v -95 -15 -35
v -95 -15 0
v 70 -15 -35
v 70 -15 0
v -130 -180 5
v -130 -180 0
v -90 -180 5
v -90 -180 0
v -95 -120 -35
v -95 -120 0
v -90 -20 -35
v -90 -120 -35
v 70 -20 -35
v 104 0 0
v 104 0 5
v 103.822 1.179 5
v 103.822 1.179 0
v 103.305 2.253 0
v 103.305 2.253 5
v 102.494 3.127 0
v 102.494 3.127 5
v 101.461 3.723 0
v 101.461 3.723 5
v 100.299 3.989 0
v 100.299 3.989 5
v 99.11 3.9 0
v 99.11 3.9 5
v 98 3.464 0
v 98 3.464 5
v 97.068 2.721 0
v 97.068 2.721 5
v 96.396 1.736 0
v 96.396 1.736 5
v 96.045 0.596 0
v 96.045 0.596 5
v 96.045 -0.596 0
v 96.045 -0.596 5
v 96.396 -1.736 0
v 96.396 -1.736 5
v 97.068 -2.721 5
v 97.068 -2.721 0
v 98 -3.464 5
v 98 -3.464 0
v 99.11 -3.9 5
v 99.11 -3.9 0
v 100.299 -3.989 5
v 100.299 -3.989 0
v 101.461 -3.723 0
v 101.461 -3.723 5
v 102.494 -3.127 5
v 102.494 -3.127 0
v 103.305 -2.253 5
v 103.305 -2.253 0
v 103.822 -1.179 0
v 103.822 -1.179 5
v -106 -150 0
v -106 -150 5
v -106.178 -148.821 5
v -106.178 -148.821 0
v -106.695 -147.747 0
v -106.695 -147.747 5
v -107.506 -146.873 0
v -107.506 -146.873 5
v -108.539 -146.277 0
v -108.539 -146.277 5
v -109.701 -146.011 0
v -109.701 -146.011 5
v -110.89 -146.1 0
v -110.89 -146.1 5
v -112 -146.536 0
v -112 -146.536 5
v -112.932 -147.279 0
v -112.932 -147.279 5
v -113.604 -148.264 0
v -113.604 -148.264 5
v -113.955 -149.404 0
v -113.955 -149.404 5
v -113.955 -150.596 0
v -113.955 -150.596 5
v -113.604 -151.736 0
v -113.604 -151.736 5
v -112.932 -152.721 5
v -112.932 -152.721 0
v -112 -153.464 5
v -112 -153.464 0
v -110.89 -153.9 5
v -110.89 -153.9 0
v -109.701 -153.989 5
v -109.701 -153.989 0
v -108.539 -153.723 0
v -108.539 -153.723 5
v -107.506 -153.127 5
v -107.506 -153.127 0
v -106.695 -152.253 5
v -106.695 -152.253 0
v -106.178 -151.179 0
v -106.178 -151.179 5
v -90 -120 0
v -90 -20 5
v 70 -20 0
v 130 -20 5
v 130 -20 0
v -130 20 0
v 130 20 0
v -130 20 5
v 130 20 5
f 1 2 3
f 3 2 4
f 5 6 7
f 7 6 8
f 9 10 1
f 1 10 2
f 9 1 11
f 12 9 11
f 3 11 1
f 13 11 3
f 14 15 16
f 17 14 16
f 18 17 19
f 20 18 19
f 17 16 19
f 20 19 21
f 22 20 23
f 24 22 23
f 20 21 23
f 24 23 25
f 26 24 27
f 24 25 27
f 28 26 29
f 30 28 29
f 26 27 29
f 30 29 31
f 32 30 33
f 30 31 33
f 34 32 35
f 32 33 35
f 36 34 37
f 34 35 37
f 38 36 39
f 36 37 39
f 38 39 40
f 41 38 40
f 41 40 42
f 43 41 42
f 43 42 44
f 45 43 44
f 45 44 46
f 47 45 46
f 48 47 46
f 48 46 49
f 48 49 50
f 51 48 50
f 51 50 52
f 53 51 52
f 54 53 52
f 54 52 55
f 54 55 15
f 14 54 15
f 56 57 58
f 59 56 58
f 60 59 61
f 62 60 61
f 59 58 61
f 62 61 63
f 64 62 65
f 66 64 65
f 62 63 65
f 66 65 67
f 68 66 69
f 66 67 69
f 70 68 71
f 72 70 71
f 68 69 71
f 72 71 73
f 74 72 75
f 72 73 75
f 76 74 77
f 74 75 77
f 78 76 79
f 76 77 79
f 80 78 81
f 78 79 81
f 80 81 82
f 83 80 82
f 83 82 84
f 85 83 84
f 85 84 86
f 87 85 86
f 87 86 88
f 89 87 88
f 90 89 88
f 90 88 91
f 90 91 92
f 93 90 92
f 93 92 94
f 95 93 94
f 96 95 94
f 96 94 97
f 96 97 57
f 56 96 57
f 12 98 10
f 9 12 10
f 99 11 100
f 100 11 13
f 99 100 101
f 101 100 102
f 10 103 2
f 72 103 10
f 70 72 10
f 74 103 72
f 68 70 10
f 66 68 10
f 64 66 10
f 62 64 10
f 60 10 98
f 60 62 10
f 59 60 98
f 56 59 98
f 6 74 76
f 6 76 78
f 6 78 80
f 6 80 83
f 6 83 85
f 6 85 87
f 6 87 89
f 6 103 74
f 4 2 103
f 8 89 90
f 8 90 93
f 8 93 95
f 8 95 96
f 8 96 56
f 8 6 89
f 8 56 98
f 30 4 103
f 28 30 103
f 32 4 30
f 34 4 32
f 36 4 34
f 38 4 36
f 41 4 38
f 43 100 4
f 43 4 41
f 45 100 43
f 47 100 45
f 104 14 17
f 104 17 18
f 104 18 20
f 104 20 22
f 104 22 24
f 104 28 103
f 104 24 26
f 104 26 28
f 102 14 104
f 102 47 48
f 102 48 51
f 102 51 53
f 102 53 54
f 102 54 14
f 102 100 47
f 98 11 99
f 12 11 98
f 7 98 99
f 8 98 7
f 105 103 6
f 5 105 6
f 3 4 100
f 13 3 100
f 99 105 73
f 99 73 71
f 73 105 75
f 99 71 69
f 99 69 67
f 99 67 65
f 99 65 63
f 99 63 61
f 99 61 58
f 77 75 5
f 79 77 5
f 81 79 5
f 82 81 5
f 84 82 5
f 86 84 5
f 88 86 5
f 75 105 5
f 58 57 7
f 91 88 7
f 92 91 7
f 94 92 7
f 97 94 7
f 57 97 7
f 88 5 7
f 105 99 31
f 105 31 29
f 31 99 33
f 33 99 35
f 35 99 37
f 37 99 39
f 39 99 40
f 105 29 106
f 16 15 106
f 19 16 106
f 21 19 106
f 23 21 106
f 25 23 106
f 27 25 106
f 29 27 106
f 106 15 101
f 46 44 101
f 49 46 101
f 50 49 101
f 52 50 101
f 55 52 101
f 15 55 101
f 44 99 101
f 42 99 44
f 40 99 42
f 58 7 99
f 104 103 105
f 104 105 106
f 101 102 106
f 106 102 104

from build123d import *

# Parameters (mm, degrees)
F0_W     = 260
F0_H     = 40
F1_DEPTH = 5
F2_W     = 160
F2_H     = 5
F3_DEPTH = 35
F4_W     = 40
F4_H     = 160
F5_DEPTH = 5
F7_DEPTH = 35
F8_R     = 4
F9_DEPTH = 25


with BuildPart() as f1:
    # F0 (on Top) → F1 (new body)
    with BuildSketch(Plane.XY):
        Rectangle(F0_W, F0_H)
    extrude(amount=F1_DEPTH)

    # F2 (on face) → F3 (join)
    with BuildSketch(Plane(origin=(0, 0, 0), x_dir=(1, 0, 0), z_dir=(0, 0, -1))):
        with Locations((-10, 17.5)):
            Rectangle(F2_W, F2_H)
    extrude(amount=F3_DEPTH)

    # F4 (on face) → F5 (join)
    with BuildSketch(Plane(origin=(0, 0, 0), x_dir=(1, 0, 0), z_dir=(0, 0, -1))):
        with Locations((-110, 100)):
            Rectangle(F4_W, F4_H)
    extrude(amount=-F5_DEPTH)

    # F6 (on face) → F7 (join)
    with BuildSketch(Plane(origin=(0, 0, 0), x_dir=(1, 0, 0), z_dir=(0, 0, -1))):
        Polygon((-95, 15), (-90, 15), (-90, 20), (-90, 120), (-95, 120), align=None)
    extrude(amount=F7_DEPTH)

    # F8 (on face) → F9 (cut)
    with BuildSketch(Plane.XY.offset(5)):
        with Locations((-110, -150)):
            Circle(F8_R)
        with Locations((100, 0)):
            Circle(F8_R)
    extrude(amount=-F9_DEPTH, mode=Mode.SUBTRACT)


solid = f1.part
